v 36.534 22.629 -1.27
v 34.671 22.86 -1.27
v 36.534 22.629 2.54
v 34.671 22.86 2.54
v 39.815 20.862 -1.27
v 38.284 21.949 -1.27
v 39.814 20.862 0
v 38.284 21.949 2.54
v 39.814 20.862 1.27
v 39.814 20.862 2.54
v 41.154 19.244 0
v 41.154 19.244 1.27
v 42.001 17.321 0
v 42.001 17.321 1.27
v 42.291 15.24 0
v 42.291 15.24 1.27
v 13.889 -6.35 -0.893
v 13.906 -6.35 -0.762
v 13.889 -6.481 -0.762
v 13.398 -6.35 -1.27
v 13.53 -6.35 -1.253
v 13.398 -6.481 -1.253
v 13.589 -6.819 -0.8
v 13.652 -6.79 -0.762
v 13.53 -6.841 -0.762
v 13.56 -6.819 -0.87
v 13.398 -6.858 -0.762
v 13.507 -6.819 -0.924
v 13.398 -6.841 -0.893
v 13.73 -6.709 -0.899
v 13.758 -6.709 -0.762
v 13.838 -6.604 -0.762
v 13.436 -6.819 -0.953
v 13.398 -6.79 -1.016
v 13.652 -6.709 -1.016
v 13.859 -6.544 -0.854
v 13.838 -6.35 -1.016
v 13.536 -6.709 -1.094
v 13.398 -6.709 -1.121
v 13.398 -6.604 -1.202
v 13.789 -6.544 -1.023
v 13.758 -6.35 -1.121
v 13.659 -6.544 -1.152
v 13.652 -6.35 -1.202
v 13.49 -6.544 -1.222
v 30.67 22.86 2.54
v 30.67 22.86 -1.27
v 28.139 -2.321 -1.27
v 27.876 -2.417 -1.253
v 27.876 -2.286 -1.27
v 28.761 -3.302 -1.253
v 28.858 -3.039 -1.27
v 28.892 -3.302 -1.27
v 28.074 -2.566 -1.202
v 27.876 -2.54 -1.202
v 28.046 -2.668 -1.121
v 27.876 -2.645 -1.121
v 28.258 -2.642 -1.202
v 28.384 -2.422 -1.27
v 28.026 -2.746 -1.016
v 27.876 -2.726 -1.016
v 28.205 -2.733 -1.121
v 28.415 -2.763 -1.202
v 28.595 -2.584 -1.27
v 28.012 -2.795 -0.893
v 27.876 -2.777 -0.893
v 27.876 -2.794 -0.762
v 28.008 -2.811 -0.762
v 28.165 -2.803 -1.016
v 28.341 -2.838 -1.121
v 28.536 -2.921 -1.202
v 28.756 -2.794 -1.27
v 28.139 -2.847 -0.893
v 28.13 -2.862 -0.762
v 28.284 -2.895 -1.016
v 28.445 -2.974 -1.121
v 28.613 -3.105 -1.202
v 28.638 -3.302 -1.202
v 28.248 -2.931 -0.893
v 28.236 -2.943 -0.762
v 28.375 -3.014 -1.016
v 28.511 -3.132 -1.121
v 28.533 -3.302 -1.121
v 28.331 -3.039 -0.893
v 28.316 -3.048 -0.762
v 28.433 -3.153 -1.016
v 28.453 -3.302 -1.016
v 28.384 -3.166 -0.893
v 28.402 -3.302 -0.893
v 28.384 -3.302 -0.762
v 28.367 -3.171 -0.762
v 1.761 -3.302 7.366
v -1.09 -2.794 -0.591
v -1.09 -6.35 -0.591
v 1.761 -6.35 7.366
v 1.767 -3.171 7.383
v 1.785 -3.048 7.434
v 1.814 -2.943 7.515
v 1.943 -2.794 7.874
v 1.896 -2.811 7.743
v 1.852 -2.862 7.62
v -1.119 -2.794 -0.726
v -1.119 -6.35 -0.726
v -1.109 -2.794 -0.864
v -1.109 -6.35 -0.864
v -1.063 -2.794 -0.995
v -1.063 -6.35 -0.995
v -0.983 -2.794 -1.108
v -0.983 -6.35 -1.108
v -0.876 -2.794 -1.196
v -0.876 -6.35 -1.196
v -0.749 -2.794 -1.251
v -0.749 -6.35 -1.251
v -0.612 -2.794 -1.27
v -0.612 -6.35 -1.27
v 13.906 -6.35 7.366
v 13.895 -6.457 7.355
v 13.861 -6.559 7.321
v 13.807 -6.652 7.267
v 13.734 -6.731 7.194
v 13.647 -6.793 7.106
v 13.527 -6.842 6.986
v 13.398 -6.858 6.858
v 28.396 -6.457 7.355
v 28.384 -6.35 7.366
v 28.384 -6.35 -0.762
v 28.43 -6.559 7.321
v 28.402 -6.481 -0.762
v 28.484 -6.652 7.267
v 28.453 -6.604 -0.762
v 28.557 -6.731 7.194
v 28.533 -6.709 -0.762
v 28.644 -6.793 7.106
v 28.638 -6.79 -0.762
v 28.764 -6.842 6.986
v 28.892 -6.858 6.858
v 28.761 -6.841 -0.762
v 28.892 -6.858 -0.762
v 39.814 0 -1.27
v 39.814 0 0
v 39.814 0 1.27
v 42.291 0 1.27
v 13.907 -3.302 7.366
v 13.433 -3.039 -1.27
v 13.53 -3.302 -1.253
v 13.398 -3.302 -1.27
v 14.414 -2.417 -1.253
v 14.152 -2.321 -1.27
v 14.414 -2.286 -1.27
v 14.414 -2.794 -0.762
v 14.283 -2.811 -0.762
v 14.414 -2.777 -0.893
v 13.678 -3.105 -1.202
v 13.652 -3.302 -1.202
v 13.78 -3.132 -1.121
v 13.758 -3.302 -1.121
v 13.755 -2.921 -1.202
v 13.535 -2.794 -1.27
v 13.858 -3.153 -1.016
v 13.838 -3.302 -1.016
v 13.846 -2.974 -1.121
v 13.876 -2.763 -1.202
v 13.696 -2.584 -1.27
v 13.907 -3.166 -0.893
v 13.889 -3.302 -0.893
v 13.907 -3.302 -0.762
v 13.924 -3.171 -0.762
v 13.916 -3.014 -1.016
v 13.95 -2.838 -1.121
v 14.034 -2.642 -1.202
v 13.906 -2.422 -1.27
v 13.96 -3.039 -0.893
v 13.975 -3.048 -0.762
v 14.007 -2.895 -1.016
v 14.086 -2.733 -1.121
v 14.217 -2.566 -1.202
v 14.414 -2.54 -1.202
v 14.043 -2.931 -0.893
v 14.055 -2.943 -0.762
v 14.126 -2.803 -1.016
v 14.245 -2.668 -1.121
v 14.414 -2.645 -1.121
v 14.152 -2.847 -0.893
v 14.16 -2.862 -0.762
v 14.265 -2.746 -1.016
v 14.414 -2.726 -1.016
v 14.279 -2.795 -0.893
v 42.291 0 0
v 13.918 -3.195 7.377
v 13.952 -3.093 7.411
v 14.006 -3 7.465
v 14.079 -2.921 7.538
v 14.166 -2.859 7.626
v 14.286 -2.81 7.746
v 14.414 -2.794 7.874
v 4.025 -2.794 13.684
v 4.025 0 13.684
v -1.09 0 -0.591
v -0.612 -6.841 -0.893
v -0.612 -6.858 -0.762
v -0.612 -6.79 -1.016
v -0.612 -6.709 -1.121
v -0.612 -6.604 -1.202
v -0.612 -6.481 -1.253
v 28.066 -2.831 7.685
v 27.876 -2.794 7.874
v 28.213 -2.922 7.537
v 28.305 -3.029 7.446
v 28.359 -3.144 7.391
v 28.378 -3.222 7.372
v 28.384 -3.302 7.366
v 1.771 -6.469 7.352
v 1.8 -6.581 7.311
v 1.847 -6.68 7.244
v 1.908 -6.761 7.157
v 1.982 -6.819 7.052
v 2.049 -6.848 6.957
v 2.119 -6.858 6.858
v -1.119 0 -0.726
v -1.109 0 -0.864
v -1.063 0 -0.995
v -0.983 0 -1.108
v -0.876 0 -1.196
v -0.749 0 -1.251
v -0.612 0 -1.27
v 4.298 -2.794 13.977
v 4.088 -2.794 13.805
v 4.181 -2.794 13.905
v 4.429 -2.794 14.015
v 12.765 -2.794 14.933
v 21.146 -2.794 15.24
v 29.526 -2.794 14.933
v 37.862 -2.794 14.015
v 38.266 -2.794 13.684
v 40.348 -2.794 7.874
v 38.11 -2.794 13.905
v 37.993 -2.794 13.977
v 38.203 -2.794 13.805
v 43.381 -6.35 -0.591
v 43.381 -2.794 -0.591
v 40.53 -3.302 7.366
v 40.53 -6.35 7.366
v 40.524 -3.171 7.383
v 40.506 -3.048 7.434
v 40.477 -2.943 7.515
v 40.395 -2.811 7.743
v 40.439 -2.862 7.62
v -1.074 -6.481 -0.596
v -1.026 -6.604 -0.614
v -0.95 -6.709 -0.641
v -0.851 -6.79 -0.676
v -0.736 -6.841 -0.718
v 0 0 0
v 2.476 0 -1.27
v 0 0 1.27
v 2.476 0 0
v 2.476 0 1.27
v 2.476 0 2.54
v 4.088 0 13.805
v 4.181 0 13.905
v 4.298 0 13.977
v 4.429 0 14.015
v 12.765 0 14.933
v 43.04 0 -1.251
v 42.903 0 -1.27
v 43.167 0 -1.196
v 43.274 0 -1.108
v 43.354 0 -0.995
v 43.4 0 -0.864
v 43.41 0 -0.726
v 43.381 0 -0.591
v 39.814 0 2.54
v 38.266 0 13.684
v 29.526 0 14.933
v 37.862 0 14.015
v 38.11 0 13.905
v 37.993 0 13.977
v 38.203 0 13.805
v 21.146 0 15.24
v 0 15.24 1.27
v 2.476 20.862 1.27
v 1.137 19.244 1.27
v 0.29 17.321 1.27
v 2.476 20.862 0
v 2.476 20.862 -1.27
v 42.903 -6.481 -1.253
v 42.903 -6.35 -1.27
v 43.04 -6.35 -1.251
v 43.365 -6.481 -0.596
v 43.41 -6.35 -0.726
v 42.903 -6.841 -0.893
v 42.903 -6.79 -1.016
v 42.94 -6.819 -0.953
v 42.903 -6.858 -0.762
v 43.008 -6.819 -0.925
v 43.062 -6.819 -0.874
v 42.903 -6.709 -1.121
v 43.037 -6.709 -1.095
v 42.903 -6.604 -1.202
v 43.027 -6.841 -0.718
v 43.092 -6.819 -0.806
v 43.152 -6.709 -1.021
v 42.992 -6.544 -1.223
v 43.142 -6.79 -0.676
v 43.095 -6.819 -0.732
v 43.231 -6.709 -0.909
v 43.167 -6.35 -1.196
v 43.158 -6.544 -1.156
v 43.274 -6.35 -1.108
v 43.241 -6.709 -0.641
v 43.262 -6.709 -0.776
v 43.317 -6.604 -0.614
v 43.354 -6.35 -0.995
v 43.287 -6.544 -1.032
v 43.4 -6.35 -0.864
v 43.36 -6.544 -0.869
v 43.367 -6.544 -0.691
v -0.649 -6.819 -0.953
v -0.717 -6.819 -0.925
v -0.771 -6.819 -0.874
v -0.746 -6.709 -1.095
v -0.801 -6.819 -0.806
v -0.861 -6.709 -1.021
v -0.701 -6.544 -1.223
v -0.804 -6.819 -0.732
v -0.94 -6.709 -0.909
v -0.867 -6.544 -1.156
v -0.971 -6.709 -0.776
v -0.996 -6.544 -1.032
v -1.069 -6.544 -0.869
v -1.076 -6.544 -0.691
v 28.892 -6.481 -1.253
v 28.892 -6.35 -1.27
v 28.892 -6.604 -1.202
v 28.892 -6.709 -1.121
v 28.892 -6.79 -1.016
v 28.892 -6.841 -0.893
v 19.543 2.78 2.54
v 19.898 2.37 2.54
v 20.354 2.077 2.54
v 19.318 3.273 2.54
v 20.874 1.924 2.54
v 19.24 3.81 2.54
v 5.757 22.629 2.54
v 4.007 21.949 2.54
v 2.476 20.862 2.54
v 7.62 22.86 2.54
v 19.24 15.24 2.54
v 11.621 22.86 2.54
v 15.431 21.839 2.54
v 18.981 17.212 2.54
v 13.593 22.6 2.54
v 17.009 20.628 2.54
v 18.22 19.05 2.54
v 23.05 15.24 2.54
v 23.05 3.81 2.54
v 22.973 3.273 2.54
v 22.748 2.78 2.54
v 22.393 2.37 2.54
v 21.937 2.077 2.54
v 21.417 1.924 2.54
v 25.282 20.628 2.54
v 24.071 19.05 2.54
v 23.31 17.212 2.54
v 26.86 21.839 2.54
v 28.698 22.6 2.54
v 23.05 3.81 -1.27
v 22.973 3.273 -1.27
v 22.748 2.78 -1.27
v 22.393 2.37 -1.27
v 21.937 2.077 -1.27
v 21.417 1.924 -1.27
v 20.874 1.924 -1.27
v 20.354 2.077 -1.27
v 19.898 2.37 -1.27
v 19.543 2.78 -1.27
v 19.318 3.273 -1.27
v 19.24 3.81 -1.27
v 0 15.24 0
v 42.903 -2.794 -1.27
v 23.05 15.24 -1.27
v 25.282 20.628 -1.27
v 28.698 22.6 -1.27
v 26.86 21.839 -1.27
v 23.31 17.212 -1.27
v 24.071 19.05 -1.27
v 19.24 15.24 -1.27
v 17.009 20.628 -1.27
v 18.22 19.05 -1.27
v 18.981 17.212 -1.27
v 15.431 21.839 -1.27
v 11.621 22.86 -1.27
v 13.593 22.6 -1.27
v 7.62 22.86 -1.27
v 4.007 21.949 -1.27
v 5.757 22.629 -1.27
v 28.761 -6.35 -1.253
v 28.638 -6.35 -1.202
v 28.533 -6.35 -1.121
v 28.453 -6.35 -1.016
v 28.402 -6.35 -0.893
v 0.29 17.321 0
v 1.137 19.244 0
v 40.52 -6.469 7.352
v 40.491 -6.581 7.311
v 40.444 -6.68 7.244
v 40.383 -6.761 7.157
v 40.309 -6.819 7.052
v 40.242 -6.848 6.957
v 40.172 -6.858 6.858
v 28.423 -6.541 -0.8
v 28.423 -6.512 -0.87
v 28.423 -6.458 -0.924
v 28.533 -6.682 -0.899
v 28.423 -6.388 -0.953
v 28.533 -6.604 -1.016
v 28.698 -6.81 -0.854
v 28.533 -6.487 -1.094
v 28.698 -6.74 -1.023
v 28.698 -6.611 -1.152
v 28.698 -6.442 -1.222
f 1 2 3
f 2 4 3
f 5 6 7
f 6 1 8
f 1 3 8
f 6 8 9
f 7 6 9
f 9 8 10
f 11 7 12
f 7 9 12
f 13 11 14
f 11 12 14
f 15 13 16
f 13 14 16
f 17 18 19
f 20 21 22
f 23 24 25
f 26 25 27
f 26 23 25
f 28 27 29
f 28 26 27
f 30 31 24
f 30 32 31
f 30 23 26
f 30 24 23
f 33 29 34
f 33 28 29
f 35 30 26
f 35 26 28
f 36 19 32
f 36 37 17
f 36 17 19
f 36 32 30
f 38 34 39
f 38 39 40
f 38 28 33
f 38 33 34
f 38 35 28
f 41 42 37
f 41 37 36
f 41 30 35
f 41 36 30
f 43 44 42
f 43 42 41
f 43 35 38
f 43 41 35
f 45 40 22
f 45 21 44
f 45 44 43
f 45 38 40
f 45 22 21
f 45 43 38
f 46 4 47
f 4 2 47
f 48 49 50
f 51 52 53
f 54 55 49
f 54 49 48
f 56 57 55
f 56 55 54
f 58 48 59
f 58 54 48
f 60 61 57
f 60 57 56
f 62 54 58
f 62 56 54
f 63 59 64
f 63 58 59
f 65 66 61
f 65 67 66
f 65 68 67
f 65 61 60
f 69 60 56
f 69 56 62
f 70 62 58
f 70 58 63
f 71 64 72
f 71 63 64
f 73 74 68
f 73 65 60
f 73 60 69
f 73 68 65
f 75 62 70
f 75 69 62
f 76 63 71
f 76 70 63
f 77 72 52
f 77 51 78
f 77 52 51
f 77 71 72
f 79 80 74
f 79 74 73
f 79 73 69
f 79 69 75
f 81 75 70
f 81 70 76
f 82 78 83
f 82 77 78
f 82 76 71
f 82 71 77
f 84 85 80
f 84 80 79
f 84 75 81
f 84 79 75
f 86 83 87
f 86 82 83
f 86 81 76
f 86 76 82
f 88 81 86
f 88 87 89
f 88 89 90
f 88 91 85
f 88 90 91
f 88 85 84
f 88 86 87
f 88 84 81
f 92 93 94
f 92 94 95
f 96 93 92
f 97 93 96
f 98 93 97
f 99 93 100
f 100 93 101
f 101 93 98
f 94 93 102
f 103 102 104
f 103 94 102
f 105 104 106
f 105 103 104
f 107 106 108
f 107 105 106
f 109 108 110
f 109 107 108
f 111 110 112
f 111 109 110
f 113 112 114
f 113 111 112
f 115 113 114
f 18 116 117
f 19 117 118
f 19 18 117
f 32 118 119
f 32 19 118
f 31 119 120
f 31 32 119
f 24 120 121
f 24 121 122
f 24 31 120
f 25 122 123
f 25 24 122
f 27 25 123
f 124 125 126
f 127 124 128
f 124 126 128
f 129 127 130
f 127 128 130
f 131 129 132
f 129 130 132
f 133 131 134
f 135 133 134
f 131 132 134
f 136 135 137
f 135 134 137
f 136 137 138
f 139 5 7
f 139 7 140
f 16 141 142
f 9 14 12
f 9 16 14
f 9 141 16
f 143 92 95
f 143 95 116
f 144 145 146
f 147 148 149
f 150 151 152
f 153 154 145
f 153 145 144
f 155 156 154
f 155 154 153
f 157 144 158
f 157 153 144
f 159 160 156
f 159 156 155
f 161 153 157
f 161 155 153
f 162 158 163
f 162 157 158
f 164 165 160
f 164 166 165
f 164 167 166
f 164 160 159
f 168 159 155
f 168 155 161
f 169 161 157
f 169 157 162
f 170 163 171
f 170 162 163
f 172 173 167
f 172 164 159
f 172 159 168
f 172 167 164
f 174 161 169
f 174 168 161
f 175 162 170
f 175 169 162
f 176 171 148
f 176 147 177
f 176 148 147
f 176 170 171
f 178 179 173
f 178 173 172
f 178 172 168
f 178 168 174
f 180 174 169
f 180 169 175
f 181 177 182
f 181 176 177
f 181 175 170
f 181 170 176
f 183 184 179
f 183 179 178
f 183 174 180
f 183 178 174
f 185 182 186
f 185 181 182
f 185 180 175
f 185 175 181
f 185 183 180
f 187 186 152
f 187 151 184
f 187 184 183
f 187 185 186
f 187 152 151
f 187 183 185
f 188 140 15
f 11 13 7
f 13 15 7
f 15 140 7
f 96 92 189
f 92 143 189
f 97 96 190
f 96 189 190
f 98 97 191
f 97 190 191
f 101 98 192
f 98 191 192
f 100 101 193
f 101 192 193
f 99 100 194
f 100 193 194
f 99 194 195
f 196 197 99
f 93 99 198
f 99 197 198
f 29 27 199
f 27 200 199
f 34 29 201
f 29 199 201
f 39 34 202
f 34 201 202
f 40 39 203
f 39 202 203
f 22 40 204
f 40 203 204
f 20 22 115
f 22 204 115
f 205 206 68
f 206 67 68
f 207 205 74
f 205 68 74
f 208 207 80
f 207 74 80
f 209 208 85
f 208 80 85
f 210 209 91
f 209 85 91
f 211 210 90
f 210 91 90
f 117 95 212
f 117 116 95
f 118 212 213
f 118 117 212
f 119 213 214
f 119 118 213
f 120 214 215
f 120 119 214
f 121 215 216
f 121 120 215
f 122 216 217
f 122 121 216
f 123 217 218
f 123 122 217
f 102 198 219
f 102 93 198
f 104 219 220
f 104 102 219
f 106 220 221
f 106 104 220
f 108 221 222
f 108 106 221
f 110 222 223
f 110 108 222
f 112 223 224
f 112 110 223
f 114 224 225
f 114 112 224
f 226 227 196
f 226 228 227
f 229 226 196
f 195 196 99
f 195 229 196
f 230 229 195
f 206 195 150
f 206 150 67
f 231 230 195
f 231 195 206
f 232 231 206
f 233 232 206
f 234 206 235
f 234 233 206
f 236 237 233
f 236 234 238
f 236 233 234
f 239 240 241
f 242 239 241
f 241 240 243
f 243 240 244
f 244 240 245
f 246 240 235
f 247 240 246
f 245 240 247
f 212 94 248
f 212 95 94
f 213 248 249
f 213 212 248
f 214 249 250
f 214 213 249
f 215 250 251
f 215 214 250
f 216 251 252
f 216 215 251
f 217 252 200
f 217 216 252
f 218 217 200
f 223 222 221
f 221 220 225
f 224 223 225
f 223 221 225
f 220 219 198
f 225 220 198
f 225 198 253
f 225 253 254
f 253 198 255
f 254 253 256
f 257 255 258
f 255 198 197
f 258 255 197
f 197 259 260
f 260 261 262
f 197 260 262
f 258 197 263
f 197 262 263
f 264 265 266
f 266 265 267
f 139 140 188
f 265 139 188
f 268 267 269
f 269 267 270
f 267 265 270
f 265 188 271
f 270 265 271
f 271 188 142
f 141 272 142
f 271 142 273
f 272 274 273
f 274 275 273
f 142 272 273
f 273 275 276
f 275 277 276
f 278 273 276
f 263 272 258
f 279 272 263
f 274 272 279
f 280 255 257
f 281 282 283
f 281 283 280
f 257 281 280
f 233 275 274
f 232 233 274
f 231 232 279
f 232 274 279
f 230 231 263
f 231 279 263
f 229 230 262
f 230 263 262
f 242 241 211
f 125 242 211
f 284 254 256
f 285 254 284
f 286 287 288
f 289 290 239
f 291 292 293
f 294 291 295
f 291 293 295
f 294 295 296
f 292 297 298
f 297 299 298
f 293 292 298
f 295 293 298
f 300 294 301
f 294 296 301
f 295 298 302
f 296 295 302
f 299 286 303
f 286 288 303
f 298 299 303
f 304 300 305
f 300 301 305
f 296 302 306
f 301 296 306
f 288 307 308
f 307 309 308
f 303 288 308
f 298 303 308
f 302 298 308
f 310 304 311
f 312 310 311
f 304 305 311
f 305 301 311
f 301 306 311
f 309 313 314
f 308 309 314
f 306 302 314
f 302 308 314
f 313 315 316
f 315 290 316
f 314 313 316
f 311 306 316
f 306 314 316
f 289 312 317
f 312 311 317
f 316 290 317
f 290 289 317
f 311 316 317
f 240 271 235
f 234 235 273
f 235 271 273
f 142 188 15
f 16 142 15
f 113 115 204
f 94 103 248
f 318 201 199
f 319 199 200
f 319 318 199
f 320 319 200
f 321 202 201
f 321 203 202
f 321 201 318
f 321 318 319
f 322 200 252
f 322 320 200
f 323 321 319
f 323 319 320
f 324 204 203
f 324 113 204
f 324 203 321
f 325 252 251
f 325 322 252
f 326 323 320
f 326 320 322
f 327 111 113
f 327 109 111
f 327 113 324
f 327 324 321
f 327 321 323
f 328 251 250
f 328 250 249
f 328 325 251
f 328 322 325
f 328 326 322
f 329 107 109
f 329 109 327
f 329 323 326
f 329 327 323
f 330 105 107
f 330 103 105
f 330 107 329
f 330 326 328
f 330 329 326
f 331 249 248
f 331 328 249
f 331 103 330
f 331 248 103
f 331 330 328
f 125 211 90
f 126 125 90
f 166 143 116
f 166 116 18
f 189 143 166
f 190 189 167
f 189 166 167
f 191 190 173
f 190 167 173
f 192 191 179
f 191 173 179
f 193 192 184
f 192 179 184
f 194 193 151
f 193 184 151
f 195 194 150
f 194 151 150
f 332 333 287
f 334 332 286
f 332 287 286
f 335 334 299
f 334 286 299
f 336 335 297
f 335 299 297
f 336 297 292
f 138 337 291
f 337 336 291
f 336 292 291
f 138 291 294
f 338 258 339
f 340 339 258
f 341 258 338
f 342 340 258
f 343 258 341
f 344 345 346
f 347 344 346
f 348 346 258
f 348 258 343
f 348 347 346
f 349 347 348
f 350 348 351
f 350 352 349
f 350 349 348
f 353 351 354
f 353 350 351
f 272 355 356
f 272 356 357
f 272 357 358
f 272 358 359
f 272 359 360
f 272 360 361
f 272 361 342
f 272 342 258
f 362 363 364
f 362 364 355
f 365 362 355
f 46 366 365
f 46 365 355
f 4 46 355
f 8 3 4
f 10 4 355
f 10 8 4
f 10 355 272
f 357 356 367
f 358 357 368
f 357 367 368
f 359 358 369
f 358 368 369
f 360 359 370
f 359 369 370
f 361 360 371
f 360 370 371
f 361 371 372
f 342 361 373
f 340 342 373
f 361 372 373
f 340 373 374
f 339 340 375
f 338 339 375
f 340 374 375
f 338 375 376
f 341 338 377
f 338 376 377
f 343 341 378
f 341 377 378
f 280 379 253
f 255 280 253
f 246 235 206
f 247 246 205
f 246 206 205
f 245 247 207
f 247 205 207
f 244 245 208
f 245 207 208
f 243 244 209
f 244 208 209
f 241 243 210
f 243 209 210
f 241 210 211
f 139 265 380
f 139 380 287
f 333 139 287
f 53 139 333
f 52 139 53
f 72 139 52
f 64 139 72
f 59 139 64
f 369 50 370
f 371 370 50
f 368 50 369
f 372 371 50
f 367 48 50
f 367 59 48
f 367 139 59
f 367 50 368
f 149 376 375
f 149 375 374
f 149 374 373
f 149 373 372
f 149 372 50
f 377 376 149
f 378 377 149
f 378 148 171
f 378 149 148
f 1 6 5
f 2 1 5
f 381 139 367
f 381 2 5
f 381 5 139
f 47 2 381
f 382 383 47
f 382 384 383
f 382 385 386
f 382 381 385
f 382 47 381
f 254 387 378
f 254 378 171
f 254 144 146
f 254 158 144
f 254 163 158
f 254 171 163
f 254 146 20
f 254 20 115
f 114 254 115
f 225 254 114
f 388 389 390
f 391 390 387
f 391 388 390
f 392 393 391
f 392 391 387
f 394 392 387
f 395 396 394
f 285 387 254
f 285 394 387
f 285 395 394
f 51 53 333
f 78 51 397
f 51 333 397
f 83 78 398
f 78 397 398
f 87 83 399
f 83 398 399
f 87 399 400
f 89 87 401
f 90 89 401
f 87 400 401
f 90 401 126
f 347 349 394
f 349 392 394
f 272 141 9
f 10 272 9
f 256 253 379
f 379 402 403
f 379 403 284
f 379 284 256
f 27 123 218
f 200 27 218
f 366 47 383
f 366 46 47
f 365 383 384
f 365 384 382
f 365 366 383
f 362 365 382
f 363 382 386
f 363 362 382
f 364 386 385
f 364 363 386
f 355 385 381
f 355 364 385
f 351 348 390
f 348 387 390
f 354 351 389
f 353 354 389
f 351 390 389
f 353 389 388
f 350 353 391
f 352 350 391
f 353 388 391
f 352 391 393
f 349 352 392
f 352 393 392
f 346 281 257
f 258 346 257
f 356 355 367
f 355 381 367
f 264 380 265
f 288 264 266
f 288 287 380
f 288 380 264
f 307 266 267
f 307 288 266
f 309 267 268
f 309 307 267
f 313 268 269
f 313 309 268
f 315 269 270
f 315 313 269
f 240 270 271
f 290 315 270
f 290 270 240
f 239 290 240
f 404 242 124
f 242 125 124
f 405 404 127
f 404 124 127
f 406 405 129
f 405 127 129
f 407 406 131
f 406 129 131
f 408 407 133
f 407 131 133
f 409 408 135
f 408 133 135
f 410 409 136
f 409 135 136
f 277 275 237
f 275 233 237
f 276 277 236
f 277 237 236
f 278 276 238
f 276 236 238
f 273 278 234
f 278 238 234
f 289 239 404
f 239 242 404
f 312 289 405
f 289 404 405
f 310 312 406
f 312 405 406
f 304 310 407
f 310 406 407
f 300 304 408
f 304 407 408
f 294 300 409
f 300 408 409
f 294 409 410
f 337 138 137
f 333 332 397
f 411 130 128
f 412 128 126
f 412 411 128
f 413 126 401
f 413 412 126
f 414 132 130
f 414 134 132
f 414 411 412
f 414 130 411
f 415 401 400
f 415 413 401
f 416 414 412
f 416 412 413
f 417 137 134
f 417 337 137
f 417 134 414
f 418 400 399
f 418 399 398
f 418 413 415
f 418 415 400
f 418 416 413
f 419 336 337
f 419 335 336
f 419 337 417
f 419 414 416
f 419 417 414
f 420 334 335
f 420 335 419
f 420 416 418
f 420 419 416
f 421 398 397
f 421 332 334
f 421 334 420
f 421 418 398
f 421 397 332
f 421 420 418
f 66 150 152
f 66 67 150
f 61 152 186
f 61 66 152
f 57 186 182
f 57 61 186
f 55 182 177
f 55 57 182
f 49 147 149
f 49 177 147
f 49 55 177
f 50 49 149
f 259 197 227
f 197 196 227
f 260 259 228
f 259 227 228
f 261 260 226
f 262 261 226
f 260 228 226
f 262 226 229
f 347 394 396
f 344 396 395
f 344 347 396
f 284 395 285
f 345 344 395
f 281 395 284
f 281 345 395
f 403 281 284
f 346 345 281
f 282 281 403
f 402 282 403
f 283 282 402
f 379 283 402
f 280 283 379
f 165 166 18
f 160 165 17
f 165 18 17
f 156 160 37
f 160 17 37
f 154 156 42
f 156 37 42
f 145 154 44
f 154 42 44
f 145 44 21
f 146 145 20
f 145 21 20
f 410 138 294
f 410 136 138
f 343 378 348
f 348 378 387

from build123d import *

# Parameters (mm, degrees)
BOSS_EXTRUDE1_DEPTH = 1.27
BOSS_EXTRUDE2_START = 1.27
BOSS_EXTRUDE2_DEPTH = 1.27
BOSS_EXTRUDE3_DEPTH = 1.27
BOSS_EXTRUDE4_DEPTH = 2.794
BOSS_EXTRUDE5_DEPTH = 4.064
FILLET1_R           = 0.508
FILLET3_R           = 7.62


with BuildPart() as part:
    # Sketch1 → Boss-Extrude1 (new body)
    with BuildSketch(Plane.XY):
        with BuildLine():
            Line((0, 0), (42.291, 0))
            Line((42.291, 0), (42.291, 22.86))
            Line((42.291, 22.86), (23.0505, 22.86))
            Line((23.0505, 22.86), (23.0505, 3.81))
            ThreePointArc((23.0505, 3.81), (21.1455, 1.905), (19.2405, 3.81))
            Line((19.2405, 3.81), (19.2405, 22.86))
            Line((19.2405, 22.86), (0, 22.86))
            Line((0, 22.86), (0, 0))
        make_face()
    extrude(amount=BOSS_EXTRUDE1_DEPTH)

    # Sketch2 → Boss-Extrude2 (add)
    with BuildSketch(Plane(origin=(0, 0, 0), x_dir=(-1, 0, 0), z_dir=(0, 0, -1)).offset(BOSS_EXTRUDE2_START)):
        with BuildLine():
            Line((-23.0505, 22.86), (-39.8145, 22.86))
            Line((-39.8145, 22.86), (-39.8145, 0))
            Line((-39.8145, 0), (-23.0505, 0))
            Line((-23.0505, 0), (-19.2405, 0))
            Line((-19.2405, 0), (-2.4765, 0))
            Line((-2.4765, 0), (-2.4765, 22.86))
            Line((-2.4765, 22.86), (-19.2405, 22.86))
            Line((-19.2405, 22.86), (-19.2405, 3.81))
            ThreePointArc((-19.2405, 3.81), (-21.1455, 1.905), (-23.0505, 3.81))
            Line((-23.0505, 3.81), (-23.0505, 22.86))
        make_face()
    extrude(amount=-BOSS_EXTRUDE2_DEPTH)

    # Sketch3 → Boss-Extrude3 (add)
    with BuildSketch(Plane.XY.offset(1.27)):
        with BuildLine():
            Line((19.2405, 22.86), (2.4765, 22.86))
            Line((2.4765, 22.86), (2.4765, 0))
            Line((2.4765, 0), (19.2405, 0))
            Line((19.2405, 0), (23.0505, 0))
            Line((23.0505, 0), (39.8145, 0))
            Line((39.8145, 0), (39.8145, 22.86))
            Line((39.8145, 22.86), (23.0505, 22.86))
            Line((23.0505, 22.86), (23.0505, 3.81))
            ThreePointArc((23.0505, 3.81), (21.1455, 1.905), (19.2405, 3.81))
            Line((19.2405, 3.81), (19.2405, 22.86))
        make_face()
    extrude(amount=BOSS_EXTRUDE3_DEPTH)

    # Sketch5 → Boss-Extrude4 (add)
    with BuildSketch(Plane.XZ):
        with BuildLine():
            Line((-1.3335, -1.27), (43.6245, -1.27))
            Line((43.6245, -1.27), (38.1635, 13.97))
            ThreePointArc((38.1635, 13.97), (21.1455, 15.24), (4.1275, 13.97))
            Line((4.1275, 13.97), (-1.3335, -1.27))
        make_face()
    extrude(amount=BOSS_EXTRUDE4_DEPTH)

    # Sketch6 → Boss-Extrude5 (add)
    with BuildSketch(Plane.XZ.offset(2.794)):
        Polygon((1.761066667, 7.366), (13.9065, 7.366), (13.9065, -1.27), (-1.3335, -1.27), align=None)
        Polygon((28.3845, -1.27), (43.6245, -1.27), (40.529933333, 7.366), (28.3845, 7.366), align=None)
    extrude(amount=BOSS_EXTRUDE5_DEPTH)

    # Fillet1
    fillet1_edges = [part.edges().sort_by_distance(p)[0] for p in [
        (28.3845, -2.794, 3.048),
        (34.457216667, -2.794, 7.366),
        (13.9065, -2.794, 3.048),
        (7.833783333, -2.794, 7.366),
        (13.9065, -4.826, -1.27),
        (21.1455, -2.794, -1.27),
        (36.0045, -6.858, -1.27),
        (28.3845, -6.858, 3.048),
        (34.457216667, -6.858, 7.366),
        (42.077216667, -6.858, 3.048),
        (7.833783333, -6.858, 7.366),
        (13.9065, -6.858, 3.048),
        (6.2865, -6.858, -1.27),
        (0.213783333, -6.858, 3.048),
        (-1.3335, -3.429, -1.27),
        (28.3845, -4.826, -1.27),
        (43.6245, -3.429, -1.27),
        (38.1635, -1.397, 13.97),
        (4.1275, -1.397, 13.97),
    ]]
    fillet(fillet1_edges, radius=FILLET1_R)

    # Fillet3
    fillet3_edges = [part.edges().sort_by_distance(p)[0] for p in [
        (23.0505, 22.86, 0.635),
        (19.2405, 22.86, 0.635),
        (0, 22.86, 0.635),
        (42.291, 22.86, 0.635),
    ]]
    fillet(fillet3_edges, radius=FILLET3_R)


solid = part.part
